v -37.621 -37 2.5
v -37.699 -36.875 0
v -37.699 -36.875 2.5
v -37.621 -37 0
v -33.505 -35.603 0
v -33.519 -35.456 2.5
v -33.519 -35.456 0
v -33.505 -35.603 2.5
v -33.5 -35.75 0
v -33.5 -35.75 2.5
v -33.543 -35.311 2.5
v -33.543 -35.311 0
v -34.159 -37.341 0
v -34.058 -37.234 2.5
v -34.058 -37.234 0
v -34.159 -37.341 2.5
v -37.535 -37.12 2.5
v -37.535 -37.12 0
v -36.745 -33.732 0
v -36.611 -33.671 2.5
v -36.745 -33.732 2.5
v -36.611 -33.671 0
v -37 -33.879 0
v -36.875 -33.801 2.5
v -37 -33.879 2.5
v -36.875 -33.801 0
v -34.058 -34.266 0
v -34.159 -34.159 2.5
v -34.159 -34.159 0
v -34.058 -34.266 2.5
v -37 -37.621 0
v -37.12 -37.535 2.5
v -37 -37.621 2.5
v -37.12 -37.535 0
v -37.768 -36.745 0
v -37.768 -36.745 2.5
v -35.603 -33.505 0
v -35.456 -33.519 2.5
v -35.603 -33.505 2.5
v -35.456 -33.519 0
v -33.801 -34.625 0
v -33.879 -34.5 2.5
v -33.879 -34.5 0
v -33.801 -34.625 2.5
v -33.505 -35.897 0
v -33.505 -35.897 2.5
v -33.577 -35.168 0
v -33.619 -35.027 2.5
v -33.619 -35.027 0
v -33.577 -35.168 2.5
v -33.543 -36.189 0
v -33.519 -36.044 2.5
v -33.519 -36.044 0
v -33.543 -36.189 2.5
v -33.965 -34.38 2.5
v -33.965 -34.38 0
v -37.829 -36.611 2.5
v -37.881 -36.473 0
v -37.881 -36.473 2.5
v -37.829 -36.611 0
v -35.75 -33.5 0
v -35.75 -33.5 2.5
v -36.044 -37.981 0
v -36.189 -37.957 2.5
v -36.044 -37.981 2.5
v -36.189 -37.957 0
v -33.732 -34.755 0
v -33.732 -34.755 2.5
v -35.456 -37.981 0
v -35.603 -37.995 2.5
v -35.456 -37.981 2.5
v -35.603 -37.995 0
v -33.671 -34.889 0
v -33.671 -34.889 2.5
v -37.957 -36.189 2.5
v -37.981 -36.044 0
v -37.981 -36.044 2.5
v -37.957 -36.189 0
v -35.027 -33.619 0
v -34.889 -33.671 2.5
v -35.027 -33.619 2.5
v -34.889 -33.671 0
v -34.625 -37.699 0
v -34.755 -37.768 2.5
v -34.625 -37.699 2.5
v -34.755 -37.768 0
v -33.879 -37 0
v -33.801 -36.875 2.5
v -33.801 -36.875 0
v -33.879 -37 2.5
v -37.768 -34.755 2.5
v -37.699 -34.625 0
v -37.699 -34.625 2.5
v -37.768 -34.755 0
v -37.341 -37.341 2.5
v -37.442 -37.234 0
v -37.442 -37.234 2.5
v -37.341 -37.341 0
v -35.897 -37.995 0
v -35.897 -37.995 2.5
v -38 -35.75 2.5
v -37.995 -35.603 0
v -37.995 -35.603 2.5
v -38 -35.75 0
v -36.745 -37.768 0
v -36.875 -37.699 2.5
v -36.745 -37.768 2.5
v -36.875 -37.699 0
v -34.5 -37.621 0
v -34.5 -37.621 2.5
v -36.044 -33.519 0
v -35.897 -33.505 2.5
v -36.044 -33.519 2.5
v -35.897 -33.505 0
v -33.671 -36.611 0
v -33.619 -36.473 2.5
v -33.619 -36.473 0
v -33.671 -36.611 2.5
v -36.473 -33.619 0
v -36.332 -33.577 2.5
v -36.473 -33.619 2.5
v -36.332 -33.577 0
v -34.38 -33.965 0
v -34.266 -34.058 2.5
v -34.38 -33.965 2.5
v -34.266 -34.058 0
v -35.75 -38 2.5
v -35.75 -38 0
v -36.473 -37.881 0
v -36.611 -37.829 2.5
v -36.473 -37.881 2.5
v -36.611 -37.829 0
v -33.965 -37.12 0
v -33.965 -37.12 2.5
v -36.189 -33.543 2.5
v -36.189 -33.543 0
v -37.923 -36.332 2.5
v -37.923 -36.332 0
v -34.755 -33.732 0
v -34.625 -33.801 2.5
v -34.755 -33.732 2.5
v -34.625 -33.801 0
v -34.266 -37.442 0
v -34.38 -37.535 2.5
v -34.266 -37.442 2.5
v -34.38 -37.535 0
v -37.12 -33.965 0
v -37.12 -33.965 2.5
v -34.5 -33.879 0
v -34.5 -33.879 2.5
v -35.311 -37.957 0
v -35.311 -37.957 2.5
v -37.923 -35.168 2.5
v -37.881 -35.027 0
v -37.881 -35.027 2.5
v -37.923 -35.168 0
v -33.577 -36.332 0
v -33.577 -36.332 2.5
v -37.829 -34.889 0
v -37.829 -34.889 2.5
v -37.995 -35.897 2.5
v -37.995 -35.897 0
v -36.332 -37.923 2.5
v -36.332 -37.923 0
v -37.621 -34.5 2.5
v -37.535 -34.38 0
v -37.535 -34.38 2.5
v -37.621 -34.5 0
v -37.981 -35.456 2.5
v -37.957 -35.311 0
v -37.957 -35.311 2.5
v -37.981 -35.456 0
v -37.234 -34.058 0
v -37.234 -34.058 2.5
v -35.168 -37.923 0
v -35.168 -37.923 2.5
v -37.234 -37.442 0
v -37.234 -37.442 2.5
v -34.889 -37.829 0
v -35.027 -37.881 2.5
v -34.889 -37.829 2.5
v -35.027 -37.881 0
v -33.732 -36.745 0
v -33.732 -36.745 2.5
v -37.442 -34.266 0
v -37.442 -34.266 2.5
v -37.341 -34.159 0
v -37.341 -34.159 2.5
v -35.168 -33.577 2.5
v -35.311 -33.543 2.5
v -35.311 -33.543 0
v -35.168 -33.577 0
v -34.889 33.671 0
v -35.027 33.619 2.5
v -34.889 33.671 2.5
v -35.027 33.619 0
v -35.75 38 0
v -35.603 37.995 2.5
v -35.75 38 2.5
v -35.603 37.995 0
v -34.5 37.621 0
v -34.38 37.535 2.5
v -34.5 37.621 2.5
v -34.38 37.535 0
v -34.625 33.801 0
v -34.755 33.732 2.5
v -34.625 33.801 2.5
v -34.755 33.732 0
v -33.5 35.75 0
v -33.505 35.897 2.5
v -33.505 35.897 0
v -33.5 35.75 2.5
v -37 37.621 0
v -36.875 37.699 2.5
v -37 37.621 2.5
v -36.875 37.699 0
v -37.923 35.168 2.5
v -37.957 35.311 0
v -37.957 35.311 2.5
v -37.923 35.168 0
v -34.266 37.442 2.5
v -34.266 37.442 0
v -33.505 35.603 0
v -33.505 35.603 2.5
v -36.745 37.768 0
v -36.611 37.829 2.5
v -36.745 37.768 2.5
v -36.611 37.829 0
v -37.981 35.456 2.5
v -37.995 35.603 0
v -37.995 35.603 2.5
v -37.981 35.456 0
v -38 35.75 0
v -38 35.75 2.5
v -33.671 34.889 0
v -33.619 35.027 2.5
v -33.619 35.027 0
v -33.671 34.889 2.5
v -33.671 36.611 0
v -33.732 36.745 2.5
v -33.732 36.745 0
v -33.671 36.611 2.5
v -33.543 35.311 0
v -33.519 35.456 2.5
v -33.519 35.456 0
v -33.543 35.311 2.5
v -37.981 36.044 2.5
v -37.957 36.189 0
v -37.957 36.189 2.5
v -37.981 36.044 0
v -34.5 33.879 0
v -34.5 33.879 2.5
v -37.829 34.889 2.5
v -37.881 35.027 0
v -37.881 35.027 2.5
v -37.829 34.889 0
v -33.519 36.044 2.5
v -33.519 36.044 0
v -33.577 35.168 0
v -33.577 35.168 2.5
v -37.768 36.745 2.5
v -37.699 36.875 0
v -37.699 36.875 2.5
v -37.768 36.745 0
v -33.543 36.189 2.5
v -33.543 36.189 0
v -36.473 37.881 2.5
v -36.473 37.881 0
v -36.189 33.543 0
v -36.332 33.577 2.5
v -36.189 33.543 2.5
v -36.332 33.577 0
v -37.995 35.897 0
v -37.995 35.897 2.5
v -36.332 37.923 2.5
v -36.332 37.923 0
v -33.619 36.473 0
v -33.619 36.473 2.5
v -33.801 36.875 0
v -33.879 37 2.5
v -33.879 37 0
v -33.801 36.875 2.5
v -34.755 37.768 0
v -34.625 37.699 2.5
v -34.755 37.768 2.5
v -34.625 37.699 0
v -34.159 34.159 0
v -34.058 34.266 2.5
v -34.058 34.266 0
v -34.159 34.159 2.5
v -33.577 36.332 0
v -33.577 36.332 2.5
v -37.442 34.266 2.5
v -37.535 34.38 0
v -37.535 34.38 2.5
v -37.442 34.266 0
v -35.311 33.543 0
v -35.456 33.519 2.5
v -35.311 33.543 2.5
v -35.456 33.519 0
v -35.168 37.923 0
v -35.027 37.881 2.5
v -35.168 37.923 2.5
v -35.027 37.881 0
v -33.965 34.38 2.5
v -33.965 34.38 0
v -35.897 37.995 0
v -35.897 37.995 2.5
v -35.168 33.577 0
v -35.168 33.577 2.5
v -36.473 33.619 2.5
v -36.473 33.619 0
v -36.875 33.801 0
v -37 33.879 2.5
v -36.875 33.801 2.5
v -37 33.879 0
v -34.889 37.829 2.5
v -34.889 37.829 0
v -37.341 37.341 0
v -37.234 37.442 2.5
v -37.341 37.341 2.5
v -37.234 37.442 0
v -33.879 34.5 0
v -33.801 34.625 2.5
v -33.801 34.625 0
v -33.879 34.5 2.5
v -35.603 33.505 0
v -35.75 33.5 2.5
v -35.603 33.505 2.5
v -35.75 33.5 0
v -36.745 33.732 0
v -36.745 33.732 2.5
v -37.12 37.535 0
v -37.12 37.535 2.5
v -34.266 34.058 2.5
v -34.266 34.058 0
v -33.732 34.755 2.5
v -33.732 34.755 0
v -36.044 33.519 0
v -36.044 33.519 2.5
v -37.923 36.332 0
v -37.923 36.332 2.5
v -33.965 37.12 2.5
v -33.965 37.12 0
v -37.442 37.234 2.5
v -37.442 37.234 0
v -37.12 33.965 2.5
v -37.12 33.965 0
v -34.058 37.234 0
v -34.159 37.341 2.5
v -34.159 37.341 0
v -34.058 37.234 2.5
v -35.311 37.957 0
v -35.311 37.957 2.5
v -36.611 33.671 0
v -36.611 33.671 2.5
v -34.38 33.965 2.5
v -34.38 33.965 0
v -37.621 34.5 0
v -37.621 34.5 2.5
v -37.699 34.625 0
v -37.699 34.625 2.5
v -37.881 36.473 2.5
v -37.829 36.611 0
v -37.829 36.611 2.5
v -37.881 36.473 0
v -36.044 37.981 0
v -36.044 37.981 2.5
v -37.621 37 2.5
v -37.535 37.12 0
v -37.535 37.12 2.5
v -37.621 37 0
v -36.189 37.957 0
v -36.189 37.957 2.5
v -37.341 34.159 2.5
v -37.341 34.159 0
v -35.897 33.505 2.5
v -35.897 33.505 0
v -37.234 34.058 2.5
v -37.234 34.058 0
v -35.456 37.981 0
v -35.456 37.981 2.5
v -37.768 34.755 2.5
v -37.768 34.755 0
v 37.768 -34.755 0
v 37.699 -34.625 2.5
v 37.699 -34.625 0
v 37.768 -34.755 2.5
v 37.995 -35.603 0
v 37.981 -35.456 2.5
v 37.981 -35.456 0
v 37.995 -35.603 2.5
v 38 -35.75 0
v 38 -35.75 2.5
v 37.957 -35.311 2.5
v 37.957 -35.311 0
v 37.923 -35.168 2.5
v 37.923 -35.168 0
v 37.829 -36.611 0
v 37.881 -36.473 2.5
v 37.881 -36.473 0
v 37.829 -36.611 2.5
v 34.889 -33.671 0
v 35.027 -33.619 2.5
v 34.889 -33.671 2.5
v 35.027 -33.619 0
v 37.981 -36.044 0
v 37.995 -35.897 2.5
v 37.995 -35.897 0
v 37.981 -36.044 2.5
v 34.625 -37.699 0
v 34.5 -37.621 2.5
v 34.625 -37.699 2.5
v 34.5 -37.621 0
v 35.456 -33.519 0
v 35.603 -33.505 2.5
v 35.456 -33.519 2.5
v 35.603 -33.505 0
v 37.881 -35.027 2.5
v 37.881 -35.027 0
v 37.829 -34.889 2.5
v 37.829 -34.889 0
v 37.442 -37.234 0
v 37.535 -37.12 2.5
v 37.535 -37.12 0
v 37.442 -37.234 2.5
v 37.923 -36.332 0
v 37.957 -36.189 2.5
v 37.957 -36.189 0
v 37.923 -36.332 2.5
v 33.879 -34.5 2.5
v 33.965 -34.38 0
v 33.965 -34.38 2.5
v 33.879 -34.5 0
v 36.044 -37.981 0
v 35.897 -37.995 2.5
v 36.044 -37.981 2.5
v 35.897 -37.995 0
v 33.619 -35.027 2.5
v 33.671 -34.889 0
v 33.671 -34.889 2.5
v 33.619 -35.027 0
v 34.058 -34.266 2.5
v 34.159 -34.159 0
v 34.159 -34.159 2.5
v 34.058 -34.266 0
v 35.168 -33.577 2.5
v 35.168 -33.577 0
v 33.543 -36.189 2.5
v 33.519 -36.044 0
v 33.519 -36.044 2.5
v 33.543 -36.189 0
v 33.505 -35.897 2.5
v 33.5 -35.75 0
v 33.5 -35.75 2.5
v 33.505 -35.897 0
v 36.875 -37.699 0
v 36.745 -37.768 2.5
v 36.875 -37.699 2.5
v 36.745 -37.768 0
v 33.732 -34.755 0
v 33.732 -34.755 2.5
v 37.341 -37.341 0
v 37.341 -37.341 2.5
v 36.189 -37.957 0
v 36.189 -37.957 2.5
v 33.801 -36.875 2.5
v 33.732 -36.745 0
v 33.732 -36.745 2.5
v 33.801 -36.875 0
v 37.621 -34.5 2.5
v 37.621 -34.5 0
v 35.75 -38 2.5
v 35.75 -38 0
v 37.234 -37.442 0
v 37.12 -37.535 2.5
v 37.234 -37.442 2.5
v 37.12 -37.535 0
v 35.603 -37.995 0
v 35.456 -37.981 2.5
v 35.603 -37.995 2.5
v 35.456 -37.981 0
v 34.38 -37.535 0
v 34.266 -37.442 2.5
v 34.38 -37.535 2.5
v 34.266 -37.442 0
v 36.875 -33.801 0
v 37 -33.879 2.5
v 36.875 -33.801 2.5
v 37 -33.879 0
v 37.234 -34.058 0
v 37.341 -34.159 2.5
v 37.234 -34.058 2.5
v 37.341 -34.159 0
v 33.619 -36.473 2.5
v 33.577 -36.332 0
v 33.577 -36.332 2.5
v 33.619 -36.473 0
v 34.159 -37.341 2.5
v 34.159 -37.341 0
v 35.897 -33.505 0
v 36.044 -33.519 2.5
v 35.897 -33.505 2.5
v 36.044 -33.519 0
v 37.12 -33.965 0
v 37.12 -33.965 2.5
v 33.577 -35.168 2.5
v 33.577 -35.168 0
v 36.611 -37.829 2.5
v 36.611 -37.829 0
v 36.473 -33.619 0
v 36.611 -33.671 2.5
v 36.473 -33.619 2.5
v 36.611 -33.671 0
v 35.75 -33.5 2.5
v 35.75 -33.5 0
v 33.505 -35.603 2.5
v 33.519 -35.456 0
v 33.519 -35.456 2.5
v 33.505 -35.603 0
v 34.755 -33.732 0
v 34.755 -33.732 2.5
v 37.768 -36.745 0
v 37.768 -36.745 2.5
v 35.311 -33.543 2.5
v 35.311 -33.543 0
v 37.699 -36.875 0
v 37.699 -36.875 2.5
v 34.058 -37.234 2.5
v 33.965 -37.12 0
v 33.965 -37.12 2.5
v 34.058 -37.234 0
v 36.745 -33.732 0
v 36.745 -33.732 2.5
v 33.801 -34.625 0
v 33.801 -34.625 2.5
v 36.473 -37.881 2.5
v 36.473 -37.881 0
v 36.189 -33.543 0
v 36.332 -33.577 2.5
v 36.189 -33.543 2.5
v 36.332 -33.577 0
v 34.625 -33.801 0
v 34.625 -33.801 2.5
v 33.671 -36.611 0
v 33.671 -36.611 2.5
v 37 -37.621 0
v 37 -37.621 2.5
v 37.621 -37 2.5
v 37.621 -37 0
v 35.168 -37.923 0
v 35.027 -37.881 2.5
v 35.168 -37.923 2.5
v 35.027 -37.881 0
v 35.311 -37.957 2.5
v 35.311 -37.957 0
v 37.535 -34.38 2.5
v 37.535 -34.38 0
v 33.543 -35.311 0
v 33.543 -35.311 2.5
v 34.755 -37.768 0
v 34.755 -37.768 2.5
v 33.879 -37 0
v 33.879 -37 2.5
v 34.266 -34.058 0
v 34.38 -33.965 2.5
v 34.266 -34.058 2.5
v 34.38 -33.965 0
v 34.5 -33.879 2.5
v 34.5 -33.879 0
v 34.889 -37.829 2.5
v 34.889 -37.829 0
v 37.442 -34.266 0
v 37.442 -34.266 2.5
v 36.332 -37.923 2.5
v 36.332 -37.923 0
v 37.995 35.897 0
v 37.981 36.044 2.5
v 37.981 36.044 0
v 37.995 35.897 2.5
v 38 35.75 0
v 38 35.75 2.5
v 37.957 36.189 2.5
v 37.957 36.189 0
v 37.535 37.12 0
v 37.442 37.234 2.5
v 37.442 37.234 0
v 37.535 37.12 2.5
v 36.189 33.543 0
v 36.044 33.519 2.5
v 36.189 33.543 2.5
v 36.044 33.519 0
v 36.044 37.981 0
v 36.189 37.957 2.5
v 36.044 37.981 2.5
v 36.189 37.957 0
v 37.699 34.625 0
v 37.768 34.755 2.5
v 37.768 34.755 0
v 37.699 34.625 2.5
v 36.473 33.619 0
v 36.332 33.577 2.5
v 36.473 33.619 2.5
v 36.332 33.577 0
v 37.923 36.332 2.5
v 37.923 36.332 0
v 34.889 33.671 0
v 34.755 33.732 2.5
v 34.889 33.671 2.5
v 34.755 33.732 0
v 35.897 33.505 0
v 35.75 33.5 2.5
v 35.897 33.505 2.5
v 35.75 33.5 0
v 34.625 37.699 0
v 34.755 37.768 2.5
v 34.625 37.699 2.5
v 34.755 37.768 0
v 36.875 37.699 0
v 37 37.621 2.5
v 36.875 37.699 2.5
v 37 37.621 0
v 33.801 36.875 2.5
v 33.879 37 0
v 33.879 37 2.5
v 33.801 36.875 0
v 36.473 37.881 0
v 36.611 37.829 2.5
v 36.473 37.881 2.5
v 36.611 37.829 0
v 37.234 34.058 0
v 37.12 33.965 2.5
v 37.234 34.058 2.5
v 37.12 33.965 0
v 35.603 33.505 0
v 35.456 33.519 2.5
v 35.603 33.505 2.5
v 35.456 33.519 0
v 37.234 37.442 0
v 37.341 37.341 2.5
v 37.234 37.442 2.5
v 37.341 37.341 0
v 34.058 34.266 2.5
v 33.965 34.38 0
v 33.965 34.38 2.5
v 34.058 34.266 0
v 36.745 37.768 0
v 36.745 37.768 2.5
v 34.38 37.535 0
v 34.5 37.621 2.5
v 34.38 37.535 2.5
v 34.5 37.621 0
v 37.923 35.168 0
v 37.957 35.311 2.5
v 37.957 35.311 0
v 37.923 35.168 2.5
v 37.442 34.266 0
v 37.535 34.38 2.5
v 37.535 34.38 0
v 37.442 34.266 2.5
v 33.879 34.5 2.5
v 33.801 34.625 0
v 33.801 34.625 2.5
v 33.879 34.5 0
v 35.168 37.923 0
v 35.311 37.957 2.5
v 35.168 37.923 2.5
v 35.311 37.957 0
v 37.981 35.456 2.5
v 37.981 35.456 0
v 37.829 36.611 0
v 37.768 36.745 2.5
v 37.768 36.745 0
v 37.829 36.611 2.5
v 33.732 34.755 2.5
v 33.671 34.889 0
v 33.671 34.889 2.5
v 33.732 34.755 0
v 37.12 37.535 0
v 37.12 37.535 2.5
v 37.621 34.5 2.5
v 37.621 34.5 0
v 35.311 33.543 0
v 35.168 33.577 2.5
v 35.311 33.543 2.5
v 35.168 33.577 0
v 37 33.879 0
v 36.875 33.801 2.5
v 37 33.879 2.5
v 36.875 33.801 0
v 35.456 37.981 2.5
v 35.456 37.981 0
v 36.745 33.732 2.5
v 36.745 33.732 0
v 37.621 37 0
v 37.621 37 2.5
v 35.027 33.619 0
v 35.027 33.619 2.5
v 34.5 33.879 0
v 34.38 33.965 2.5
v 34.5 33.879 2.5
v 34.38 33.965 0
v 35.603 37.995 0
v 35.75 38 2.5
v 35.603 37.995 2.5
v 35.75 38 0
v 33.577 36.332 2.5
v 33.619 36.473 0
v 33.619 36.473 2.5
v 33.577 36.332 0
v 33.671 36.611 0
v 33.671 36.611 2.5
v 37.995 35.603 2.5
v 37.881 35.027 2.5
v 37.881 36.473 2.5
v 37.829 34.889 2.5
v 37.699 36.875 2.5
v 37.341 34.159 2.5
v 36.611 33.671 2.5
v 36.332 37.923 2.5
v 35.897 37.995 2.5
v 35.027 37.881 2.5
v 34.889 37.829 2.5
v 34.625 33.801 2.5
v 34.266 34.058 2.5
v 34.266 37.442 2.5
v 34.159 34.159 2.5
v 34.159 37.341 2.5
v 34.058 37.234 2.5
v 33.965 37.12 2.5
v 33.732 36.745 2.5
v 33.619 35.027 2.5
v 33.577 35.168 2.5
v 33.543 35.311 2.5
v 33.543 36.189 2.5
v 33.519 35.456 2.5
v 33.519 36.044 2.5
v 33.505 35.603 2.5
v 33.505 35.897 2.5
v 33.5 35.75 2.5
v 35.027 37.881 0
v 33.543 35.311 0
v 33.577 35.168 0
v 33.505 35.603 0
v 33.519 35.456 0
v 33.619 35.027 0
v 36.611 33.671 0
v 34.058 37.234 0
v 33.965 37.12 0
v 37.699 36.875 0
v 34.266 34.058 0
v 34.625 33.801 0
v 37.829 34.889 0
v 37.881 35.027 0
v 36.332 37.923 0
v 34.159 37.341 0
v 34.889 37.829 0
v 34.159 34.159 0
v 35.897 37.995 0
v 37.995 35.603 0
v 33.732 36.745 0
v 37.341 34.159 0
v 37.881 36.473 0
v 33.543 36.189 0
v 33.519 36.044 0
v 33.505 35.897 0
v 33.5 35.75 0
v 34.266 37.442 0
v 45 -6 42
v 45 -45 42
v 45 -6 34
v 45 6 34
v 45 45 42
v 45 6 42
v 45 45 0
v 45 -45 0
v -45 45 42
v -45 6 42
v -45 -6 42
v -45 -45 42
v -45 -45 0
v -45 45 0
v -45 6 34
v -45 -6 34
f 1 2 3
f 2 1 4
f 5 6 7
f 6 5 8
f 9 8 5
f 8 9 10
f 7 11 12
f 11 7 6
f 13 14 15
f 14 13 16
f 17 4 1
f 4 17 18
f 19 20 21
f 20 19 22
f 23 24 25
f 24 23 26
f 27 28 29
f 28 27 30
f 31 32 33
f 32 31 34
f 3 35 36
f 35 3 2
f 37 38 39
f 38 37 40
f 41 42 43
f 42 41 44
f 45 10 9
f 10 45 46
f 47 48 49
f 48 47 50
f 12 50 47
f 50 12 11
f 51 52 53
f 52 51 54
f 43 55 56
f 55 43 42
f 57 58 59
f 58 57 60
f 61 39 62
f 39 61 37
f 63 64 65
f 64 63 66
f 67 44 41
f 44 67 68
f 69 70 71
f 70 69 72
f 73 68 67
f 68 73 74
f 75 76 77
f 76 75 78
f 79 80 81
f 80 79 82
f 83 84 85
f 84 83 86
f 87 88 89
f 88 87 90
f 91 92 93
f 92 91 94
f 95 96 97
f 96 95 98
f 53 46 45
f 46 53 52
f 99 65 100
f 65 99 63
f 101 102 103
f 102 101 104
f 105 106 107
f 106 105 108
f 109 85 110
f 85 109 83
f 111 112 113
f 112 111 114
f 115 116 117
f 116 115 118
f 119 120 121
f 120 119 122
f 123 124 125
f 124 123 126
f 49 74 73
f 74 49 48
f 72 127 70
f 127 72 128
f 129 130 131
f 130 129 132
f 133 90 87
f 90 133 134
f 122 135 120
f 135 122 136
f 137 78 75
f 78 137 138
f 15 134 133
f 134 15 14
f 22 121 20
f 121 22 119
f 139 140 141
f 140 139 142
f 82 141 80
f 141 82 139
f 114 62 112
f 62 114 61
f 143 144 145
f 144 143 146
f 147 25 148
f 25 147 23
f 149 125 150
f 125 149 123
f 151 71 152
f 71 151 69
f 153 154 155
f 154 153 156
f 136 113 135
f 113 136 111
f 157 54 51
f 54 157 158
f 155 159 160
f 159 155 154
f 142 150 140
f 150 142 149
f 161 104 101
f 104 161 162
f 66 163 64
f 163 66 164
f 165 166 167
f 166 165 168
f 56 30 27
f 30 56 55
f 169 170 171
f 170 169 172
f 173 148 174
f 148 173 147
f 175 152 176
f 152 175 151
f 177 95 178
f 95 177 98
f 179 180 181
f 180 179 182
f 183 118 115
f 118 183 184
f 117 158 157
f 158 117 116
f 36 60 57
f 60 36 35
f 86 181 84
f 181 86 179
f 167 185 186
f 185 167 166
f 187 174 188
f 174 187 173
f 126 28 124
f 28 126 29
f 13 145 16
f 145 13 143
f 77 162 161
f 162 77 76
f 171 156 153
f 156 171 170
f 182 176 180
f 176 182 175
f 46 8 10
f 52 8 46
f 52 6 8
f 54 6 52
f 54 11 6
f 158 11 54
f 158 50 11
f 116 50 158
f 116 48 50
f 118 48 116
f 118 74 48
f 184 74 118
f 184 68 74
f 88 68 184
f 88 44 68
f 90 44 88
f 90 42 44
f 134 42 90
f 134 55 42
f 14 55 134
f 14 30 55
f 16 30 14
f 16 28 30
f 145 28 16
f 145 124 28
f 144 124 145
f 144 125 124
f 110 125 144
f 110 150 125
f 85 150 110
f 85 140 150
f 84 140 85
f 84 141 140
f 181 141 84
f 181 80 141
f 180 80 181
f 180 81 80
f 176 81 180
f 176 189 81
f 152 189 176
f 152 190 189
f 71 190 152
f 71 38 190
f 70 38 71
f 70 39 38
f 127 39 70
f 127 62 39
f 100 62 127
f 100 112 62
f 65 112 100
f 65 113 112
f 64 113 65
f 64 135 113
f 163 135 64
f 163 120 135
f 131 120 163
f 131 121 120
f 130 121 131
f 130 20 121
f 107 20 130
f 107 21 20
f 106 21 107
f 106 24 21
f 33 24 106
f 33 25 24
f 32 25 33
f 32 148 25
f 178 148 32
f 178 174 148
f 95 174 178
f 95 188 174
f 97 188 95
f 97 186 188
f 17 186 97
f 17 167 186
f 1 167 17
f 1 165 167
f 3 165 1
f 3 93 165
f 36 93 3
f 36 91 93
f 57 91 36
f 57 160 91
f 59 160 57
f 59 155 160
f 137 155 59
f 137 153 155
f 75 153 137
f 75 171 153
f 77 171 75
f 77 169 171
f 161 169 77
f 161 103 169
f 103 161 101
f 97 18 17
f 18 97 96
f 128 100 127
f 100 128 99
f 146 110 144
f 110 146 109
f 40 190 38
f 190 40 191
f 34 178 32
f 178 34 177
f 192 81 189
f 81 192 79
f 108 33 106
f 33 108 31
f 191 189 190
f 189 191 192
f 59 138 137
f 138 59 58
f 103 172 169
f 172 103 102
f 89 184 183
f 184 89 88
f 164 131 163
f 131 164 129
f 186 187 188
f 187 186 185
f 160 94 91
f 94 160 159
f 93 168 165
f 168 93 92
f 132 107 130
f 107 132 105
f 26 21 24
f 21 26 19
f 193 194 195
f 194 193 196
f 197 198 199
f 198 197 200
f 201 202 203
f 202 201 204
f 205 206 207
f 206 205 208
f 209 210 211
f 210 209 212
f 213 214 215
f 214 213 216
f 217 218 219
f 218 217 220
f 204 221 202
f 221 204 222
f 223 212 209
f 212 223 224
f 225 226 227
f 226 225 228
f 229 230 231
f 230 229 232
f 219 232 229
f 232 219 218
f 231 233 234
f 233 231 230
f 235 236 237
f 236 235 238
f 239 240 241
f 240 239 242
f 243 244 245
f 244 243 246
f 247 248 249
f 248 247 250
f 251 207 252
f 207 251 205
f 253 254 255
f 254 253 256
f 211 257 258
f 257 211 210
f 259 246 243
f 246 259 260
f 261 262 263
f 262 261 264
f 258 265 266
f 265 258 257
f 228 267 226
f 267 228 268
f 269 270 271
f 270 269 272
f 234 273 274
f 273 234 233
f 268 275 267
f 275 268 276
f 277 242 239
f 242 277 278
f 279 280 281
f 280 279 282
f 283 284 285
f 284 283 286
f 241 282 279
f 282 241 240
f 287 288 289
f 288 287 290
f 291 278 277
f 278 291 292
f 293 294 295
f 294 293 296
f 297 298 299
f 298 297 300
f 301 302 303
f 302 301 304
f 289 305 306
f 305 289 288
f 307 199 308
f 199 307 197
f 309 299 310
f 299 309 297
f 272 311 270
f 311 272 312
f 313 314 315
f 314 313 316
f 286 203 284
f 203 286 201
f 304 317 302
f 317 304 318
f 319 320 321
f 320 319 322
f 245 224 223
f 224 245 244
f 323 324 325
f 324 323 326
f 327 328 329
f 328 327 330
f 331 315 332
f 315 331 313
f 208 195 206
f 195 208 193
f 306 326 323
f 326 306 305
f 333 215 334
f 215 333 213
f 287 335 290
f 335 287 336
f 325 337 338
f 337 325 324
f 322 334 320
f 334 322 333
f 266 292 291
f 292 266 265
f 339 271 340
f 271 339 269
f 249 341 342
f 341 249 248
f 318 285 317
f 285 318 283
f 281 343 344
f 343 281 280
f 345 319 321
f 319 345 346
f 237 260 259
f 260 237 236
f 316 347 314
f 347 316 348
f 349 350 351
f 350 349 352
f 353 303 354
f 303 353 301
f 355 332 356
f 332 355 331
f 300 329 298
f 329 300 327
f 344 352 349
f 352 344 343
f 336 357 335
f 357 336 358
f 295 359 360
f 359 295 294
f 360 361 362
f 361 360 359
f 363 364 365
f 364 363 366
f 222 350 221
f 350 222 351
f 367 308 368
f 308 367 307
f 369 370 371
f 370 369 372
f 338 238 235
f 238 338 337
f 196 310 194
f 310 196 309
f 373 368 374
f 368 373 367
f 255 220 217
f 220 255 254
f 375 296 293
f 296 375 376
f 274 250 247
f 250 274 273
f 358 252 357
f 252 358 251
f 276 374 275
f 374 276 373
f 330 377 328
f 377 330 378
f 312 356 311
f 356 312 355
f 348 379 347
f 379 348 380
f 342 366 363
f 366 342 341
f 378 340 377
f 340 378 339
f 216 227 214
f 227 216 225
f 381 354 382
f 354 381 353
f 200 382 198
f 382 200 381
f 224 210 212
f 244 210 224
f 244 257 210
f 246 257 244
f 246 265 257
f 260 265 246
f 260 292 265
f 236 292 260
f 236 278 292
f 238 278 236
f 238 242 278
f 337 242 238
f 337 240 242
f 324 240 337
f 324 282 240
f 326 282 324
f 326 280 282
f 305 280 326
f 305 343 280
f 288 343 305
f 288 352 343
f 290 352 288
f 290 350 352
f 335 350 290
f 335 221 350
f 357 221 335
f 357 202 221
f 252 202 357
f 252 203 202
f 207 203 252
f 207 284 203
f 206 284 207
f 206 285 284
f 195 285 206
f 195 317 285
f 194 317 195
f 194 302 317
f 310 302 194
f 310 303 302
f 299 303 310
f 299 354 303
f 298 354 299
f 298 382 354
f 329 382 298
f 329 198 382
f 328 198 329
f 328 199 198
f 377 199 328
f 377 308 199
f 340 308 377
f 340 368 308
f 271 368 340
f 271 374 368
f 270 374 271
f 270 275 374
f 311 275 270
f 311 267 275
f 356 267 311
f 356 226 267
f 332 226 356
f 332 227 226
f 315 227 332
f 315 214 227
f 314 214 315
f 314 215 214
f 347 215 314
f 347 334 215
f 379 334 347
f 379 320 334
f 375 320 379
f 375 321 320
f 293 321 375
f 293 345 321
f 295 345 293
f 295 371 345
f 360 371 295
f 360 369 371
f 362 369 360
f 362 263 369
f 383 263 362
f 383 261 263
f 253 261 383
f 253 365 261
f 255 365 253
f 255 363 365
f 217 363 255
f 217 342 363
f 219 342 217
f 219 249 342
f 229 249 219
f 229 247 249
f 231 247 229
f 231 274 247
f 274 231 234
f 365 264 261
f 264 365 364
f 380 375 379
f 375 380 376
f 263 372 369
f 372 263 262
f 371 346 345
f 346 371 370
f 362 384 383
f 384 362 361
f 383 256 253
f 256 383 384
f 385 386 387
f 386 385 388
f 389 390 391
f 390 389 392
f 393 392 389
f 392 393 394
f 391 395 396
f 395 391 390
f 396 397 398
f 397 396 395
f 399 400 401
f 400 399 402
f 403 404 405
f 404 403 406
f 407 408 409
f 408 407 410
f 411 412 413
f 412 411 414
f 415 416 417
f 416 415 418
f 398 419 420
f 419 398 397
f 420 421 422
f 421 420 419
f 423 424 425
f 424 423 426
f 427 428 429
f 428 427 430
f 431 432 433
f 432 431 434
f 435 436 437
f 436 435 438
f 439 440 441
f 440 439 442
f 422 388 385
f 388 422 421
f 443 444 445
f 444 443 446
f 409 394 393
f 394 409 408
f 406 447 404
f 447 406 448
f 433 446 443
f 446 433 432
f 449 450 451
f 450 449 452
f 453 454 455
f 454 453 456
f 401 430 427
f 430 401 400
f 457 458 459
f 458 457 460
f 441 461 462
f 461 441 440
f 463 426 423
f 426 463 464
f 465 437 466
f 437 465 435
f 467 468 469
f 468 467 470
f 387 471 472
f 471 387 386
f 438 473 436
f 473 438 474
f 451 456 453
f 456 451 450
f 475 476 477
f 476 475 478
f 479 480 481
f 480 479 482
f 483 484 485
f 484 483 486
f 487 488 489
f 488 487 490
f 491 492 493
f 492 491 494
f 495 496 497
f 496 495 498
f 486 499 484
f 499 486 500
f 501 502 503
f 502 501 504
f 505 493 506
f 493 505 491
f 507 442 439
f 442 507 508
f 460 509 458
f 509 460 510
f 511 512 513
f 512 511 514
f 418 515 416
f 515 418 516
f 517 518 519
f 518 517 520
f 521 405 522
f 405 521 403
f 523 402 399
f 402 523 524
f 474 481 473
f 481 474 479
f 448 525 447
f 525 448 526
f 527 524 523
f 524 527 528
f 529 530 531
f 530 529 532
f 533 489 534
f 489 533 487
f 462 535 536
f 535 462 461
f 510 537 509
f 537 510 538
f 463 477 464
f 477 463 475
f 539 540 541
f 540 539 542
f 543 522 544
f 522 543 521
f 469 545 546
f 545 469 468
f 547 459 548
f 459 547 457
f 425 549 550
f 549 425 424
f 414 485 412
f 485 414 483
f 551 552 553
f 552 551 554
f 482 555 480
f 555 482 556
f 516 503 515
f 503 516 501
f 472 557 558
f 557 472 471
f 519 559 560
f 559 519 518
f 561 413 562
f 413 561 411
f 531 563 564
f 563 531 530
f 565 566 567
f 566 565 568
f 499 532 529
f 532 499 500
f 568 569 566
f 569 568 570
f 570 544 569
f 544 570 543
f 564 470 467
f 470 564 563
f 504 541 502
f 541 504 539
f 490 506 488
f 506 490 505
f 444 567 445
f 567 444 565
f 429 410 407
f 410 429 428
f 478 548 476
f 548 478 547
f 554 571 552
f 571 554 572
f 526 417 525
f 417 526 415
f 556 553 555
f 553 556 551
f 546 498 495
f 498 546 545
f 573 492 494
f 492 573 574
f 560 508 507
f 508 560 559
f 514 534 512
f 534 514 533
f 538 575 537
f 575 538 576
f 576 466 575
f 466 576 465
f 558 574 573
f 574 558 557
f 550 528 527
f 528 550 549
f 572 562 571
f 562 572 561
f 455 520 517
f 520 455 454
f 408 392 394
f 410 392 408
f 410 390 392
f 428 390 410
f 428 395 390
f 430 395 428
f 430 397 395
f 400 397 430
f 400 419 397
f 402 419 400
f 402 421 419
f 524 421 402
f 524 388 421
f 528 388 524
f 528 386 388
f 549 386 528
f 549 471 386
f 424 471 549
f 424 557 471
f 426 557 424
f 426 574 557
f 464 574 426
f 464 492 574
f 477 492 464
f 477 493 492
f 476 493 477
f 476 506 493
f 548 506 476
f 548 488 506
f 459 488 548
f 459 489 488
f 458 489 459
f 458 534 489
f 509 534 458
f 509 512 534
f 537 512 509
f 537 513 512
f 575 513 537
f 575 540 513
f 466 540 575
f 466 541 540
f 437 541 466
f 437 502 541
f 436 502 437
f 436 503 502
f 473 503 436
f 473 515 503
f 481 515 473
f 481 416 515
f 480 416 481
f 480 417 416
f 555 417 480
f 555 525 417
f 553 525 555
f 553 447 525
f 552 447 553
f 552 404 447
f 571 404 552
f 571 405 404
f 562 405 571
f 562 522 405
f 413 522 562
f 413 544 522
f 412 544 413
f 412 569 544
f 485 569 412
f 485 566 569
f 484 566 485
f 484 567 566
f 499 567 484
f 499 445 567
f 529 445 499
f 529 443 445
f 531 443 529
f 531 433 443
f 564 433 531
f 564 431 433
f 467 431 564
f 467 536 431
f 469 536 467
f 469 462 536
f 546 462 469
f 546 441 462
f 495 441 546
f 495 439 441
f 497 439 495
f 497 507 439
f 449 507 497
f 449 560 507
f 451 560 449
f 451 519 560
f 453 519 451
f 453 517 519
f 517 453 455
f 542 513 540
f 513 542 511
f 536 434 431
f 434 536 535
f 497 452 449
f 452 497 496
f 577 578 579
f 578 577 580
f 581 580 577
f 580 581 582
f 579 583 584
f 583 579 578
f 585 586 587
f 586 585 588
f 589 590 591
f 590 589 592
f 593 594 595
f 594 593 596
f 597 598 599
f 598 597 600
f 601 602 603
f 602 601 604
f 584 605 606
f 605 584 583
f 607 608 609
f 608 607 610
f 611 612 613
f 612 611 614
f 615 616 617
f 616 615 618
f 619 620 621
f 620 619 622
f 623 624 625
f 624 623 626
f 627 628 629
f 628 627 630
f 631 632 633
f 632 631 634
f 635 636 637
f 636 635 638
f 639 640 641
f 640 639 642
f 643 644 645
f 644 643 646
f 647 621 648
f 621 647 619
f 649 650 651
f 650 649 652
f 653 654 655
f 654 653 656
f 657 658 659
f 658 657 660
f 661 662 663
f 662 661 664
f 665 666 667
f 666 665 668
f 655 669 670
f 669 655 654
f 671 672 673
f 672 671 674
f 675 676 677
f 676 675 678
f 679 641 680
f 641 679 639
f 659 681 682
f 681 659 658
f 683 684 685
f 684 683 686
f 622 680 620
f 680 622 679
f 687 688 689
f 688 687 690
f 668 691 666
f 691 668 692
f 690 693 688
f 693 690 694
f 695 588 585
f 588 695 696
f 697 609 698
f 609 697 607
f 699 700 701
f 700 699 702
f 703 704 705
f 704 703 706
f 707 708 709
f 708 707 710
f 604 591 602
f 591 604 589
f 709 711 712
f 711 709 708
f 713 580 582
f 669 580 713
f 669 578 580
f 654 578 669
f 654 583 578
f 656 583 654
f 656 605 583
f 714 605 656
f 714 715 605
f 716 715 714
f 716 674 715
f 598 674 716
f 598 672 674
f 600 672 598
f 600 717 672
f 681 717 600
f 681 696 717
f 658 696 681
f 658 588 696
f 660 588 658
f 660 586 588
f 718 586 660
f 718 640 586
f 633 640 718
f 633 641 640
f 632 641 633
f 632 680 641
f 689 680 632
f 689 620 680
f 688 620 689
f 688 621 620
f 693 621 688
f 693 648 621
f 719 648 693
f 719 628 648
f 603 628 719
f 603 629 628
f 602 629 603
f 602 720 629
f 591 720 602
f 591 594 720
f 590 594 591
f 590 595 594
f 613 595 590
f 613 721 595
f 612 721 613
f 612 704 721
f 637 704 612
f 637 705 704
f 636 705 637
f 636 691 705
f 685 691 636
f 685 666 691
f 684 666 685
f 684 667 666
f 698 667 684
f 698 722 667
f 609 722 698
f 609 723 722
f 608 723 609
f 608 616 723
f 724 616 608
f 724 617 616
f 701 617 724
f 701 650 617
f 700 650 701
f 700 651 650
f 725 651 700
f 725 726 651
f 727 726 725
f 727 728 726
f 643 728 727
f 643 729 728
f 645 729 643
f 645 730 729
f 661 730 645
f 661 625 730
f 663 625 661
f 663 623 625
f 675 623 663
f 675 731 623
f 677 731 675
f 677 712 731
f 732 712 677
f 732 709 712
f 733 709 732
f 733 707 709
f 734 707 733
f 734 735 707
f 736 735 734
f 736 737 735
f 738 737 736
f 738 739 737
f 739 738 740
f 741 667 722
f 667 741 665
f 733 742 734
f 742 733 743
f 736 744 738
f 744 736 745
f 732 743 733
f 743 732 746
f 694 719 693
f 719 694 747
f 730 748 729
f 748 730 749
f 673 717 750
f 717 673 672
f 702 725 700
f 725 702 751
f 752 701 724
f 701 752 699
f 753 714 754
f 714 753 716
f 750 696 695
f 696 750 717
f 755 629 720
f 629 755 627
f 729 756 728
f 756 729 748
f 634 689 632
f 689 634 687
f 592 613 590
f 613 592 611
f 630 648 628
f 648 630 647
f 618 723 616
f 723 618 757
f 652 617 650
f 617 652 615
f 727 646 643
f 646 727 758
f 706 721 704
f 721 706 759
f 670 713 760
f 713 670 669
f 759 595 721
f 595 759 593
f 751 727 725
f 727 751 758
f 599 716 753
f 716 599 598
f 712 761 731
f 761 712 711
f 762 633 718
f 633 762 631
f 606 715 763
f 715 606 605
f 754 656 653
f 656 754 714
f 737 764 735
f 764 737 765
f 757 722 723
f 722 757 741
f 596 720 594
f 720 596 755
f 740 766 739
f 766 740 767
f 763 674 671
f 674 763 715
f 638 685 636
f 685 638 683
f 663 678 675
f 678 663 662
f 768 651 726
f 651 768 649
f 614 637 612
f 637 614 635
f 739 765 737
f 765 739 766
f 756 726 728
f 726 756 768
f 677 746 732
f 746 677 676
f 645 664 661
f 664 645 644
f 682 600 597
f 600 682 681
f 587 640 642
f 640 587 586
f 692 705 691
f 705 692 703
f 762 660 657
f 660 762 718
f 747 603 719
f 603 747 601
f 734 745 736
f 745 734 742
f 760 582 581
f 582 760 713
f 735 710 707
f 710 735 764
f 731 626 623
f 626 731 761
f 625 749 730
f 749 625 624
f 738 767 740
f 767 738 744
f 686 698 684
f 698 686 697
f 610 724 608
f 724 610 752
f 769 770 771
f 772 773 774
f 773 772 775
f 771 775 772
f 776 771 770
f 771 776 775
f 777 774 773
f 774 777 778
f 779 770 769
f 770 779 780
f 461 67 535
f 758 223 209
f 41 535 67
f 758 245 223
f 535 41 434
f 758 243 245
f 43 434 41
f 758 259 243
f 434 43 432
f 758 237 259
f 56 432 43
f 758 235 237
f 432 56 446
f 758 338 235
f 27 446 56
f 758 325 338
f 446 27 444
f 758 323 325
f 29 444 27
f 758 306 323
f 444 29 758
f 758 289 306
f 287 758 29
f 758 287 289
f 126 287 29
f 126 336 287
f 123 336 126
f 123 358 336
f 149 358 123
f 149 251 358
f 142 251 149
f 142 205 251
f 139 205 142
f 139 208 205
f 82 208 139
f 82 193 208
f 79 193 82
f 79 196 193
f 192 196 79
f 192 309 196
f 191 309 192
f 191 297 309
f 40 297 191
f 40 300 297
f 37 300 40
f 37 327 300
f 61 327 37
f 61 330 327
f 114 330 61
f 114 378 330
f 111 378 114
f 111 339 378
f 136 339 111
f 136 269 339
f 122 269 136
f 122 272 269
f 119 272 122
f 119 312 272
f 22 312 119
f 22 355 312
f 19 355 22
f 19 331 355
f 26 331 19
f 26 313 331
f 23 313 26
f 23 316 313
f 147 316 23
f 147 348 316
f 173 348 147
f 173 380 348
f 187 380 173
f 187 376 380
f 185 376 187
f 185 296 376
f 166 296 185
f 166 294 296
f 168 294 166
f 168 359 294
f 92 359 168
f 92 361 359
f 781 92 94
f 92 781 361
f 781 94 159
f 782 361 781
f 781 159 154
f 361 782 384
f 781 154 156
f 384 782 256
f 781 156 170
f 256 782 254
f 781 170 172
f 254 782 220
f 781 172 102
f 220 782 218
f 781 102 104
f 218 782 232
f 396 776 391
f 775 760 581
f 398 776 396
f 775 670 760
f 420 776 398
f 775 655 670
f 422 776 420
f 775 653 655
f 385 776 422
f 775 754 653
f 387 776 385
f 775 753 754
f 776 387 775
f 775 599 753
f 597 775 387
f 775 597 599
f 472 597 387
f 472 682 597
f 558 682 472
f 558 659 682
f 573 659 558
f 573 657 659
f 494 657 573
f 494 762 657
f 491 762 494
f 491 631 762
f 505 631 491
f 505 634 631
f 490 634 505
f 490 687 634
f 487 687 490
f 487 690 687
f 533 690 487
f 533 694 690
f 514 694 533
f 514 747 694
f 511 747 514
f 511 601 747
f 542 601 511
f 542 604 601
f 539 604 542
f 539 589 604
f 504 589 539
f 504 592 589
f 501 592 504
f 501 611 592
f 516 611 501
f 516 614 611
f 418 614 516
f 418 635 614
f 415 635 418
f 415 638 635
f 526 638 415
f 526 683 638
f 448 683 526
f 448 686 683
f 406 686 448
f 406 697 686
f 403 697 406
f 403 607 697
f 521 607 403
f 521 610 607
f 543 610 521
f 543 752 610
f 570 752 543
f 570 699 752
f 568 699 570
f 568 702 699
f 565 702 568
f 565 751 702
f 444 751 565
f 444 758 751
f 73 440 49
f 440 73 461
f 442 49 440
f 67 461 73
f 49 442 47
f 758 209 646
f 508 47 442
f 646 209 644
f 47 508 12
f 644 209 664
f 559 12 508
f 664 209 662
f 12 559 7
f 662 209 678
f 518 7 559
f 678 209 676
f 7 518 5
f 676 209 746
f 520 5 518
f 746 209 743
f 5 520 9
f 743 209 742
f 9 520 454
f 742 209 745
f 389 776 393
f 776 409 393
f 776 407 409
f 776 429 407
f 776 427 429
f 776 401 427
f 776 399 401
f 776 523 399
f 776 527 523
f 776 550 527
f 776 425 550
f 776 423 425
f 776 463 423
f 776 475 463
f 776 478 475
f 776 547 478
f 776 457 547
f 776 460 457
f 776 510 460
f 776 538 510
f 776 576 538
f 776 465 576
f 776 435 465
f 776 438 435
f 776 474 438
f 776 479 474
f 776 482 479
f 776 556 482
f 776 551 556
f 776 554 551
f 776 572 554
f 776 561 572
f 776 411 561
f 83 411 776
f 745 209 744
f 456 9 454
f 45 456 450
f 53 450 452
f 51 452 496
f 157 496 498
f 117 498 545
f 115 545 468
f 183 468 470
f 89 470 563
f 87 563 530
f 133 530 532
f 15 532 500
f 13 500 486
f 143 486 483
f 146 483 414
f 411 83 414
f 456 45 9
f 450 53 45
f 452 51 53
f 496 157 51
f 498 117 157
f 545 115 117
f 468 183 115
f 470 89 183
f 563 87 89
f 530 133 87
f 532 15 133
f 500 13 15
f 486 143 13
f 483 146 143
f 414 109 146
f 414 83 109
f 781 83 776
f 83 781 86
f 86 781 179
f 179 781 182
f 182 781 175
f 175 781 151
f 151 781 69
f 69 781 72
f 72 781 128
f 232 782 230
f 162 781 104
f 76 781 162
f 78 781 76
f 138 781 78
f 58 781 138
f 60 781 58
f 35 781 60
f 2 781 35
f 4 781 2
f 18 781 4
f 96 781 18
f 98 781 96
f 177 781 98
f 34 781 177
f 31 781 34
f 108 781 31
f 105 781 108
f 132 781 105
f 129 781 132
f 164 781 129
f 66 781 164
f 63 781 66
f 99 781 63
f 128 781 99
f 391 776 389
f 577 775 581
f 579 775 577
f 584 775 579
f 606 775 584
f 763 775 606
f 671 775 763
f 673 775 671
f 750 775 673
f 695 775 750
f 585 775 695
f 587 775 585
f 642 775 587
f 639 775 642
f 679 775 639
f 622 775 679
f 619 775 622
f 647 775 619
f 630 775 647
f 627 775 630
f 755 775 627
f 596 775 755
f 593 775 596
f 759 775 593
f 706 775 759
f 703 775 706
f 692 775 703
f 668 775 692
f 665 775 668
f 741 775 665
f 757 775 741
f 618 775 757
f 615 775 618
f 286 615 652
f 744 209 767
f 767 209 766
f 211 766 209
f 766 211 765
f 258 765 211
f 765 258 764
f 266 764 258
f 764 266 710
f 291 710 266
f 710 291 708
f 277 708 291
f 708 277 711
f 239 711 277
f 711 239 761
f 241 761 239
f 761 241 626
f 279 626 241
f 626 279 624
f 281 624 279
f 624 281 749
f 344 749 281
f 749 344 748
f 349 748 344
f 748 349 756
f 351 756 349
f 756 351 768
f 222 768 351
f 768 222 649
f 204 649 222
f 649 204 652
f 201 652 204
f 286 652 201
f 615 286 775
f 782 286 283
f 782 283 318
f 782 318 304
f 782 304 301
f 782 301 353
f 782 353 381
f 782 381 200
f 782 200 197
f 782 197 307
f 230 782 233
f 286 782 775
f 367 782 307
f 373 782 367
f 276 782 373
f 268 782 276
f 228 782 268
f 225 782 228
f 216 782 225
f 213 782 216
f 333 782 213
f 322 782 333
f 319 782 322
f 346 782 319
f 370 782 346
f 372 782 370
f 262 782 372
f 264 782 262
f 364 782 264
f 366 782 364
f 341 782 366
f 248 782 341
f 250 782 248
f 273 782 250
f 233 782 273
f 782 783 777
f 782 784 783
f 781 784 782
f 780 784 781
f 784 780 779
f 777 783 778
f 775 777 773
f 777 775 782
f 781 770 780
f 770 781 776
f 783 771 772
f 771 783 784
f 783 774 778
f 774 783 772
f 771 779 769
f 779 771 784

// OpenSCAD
// Magnetic stirrer housing for 80 mm PC case fan
// Print orientation: top plate on bed (z = 0), walls rise to z = 40

// ---------- Parameters ----------
fan_d        = 80;    // fan diameter
outer_x      = 90;    // outer size in X
outer_y      = 90;    // outer size in Y
wall         = 2.5;   // wall thickness
top_t        = 2;     // top plate thickness
open_h       = 40;    // height of open box (from top plate up)
screw_d      = 4.5;   // M4 screw hole diameter
screw_pitch  = 71.5;  // square pattern side for screw holes
notch_w      = 12;    // cable notch width
notch_depth  = 8;     // cable notch depth from open edge
eps          = 0.5;   // cutter overshoot past faces

$fn = 96;

// ---------- Model ----------
difference() {
    // Solid block: top plate + four walls, open top
    translate([-outer_x/2, -outer_y/2, 0])
        cube([outer_x, outer_y, open_h + top_t]);

    // Screw holes through top plate, centred on plate
    for (sx = [-screw_pitch/2, screw_pitch/2])
        for (sy = [-screw_pitch/2, screw_pitch/2])
            translate([sx, sy, -eps])
                cylinder(d = screw_d, h = top_t + 2*eps);

    // Cable notch in one wall: centred along wall,
    // reaches down from open edge (z = open_h to open_h + notch_depth)
    translate([-outer_x/2, -notch_w/2, open_h + top_t - notch_depth])
        cube([outer_x, notch_w, notch_depth + eps]);
}
